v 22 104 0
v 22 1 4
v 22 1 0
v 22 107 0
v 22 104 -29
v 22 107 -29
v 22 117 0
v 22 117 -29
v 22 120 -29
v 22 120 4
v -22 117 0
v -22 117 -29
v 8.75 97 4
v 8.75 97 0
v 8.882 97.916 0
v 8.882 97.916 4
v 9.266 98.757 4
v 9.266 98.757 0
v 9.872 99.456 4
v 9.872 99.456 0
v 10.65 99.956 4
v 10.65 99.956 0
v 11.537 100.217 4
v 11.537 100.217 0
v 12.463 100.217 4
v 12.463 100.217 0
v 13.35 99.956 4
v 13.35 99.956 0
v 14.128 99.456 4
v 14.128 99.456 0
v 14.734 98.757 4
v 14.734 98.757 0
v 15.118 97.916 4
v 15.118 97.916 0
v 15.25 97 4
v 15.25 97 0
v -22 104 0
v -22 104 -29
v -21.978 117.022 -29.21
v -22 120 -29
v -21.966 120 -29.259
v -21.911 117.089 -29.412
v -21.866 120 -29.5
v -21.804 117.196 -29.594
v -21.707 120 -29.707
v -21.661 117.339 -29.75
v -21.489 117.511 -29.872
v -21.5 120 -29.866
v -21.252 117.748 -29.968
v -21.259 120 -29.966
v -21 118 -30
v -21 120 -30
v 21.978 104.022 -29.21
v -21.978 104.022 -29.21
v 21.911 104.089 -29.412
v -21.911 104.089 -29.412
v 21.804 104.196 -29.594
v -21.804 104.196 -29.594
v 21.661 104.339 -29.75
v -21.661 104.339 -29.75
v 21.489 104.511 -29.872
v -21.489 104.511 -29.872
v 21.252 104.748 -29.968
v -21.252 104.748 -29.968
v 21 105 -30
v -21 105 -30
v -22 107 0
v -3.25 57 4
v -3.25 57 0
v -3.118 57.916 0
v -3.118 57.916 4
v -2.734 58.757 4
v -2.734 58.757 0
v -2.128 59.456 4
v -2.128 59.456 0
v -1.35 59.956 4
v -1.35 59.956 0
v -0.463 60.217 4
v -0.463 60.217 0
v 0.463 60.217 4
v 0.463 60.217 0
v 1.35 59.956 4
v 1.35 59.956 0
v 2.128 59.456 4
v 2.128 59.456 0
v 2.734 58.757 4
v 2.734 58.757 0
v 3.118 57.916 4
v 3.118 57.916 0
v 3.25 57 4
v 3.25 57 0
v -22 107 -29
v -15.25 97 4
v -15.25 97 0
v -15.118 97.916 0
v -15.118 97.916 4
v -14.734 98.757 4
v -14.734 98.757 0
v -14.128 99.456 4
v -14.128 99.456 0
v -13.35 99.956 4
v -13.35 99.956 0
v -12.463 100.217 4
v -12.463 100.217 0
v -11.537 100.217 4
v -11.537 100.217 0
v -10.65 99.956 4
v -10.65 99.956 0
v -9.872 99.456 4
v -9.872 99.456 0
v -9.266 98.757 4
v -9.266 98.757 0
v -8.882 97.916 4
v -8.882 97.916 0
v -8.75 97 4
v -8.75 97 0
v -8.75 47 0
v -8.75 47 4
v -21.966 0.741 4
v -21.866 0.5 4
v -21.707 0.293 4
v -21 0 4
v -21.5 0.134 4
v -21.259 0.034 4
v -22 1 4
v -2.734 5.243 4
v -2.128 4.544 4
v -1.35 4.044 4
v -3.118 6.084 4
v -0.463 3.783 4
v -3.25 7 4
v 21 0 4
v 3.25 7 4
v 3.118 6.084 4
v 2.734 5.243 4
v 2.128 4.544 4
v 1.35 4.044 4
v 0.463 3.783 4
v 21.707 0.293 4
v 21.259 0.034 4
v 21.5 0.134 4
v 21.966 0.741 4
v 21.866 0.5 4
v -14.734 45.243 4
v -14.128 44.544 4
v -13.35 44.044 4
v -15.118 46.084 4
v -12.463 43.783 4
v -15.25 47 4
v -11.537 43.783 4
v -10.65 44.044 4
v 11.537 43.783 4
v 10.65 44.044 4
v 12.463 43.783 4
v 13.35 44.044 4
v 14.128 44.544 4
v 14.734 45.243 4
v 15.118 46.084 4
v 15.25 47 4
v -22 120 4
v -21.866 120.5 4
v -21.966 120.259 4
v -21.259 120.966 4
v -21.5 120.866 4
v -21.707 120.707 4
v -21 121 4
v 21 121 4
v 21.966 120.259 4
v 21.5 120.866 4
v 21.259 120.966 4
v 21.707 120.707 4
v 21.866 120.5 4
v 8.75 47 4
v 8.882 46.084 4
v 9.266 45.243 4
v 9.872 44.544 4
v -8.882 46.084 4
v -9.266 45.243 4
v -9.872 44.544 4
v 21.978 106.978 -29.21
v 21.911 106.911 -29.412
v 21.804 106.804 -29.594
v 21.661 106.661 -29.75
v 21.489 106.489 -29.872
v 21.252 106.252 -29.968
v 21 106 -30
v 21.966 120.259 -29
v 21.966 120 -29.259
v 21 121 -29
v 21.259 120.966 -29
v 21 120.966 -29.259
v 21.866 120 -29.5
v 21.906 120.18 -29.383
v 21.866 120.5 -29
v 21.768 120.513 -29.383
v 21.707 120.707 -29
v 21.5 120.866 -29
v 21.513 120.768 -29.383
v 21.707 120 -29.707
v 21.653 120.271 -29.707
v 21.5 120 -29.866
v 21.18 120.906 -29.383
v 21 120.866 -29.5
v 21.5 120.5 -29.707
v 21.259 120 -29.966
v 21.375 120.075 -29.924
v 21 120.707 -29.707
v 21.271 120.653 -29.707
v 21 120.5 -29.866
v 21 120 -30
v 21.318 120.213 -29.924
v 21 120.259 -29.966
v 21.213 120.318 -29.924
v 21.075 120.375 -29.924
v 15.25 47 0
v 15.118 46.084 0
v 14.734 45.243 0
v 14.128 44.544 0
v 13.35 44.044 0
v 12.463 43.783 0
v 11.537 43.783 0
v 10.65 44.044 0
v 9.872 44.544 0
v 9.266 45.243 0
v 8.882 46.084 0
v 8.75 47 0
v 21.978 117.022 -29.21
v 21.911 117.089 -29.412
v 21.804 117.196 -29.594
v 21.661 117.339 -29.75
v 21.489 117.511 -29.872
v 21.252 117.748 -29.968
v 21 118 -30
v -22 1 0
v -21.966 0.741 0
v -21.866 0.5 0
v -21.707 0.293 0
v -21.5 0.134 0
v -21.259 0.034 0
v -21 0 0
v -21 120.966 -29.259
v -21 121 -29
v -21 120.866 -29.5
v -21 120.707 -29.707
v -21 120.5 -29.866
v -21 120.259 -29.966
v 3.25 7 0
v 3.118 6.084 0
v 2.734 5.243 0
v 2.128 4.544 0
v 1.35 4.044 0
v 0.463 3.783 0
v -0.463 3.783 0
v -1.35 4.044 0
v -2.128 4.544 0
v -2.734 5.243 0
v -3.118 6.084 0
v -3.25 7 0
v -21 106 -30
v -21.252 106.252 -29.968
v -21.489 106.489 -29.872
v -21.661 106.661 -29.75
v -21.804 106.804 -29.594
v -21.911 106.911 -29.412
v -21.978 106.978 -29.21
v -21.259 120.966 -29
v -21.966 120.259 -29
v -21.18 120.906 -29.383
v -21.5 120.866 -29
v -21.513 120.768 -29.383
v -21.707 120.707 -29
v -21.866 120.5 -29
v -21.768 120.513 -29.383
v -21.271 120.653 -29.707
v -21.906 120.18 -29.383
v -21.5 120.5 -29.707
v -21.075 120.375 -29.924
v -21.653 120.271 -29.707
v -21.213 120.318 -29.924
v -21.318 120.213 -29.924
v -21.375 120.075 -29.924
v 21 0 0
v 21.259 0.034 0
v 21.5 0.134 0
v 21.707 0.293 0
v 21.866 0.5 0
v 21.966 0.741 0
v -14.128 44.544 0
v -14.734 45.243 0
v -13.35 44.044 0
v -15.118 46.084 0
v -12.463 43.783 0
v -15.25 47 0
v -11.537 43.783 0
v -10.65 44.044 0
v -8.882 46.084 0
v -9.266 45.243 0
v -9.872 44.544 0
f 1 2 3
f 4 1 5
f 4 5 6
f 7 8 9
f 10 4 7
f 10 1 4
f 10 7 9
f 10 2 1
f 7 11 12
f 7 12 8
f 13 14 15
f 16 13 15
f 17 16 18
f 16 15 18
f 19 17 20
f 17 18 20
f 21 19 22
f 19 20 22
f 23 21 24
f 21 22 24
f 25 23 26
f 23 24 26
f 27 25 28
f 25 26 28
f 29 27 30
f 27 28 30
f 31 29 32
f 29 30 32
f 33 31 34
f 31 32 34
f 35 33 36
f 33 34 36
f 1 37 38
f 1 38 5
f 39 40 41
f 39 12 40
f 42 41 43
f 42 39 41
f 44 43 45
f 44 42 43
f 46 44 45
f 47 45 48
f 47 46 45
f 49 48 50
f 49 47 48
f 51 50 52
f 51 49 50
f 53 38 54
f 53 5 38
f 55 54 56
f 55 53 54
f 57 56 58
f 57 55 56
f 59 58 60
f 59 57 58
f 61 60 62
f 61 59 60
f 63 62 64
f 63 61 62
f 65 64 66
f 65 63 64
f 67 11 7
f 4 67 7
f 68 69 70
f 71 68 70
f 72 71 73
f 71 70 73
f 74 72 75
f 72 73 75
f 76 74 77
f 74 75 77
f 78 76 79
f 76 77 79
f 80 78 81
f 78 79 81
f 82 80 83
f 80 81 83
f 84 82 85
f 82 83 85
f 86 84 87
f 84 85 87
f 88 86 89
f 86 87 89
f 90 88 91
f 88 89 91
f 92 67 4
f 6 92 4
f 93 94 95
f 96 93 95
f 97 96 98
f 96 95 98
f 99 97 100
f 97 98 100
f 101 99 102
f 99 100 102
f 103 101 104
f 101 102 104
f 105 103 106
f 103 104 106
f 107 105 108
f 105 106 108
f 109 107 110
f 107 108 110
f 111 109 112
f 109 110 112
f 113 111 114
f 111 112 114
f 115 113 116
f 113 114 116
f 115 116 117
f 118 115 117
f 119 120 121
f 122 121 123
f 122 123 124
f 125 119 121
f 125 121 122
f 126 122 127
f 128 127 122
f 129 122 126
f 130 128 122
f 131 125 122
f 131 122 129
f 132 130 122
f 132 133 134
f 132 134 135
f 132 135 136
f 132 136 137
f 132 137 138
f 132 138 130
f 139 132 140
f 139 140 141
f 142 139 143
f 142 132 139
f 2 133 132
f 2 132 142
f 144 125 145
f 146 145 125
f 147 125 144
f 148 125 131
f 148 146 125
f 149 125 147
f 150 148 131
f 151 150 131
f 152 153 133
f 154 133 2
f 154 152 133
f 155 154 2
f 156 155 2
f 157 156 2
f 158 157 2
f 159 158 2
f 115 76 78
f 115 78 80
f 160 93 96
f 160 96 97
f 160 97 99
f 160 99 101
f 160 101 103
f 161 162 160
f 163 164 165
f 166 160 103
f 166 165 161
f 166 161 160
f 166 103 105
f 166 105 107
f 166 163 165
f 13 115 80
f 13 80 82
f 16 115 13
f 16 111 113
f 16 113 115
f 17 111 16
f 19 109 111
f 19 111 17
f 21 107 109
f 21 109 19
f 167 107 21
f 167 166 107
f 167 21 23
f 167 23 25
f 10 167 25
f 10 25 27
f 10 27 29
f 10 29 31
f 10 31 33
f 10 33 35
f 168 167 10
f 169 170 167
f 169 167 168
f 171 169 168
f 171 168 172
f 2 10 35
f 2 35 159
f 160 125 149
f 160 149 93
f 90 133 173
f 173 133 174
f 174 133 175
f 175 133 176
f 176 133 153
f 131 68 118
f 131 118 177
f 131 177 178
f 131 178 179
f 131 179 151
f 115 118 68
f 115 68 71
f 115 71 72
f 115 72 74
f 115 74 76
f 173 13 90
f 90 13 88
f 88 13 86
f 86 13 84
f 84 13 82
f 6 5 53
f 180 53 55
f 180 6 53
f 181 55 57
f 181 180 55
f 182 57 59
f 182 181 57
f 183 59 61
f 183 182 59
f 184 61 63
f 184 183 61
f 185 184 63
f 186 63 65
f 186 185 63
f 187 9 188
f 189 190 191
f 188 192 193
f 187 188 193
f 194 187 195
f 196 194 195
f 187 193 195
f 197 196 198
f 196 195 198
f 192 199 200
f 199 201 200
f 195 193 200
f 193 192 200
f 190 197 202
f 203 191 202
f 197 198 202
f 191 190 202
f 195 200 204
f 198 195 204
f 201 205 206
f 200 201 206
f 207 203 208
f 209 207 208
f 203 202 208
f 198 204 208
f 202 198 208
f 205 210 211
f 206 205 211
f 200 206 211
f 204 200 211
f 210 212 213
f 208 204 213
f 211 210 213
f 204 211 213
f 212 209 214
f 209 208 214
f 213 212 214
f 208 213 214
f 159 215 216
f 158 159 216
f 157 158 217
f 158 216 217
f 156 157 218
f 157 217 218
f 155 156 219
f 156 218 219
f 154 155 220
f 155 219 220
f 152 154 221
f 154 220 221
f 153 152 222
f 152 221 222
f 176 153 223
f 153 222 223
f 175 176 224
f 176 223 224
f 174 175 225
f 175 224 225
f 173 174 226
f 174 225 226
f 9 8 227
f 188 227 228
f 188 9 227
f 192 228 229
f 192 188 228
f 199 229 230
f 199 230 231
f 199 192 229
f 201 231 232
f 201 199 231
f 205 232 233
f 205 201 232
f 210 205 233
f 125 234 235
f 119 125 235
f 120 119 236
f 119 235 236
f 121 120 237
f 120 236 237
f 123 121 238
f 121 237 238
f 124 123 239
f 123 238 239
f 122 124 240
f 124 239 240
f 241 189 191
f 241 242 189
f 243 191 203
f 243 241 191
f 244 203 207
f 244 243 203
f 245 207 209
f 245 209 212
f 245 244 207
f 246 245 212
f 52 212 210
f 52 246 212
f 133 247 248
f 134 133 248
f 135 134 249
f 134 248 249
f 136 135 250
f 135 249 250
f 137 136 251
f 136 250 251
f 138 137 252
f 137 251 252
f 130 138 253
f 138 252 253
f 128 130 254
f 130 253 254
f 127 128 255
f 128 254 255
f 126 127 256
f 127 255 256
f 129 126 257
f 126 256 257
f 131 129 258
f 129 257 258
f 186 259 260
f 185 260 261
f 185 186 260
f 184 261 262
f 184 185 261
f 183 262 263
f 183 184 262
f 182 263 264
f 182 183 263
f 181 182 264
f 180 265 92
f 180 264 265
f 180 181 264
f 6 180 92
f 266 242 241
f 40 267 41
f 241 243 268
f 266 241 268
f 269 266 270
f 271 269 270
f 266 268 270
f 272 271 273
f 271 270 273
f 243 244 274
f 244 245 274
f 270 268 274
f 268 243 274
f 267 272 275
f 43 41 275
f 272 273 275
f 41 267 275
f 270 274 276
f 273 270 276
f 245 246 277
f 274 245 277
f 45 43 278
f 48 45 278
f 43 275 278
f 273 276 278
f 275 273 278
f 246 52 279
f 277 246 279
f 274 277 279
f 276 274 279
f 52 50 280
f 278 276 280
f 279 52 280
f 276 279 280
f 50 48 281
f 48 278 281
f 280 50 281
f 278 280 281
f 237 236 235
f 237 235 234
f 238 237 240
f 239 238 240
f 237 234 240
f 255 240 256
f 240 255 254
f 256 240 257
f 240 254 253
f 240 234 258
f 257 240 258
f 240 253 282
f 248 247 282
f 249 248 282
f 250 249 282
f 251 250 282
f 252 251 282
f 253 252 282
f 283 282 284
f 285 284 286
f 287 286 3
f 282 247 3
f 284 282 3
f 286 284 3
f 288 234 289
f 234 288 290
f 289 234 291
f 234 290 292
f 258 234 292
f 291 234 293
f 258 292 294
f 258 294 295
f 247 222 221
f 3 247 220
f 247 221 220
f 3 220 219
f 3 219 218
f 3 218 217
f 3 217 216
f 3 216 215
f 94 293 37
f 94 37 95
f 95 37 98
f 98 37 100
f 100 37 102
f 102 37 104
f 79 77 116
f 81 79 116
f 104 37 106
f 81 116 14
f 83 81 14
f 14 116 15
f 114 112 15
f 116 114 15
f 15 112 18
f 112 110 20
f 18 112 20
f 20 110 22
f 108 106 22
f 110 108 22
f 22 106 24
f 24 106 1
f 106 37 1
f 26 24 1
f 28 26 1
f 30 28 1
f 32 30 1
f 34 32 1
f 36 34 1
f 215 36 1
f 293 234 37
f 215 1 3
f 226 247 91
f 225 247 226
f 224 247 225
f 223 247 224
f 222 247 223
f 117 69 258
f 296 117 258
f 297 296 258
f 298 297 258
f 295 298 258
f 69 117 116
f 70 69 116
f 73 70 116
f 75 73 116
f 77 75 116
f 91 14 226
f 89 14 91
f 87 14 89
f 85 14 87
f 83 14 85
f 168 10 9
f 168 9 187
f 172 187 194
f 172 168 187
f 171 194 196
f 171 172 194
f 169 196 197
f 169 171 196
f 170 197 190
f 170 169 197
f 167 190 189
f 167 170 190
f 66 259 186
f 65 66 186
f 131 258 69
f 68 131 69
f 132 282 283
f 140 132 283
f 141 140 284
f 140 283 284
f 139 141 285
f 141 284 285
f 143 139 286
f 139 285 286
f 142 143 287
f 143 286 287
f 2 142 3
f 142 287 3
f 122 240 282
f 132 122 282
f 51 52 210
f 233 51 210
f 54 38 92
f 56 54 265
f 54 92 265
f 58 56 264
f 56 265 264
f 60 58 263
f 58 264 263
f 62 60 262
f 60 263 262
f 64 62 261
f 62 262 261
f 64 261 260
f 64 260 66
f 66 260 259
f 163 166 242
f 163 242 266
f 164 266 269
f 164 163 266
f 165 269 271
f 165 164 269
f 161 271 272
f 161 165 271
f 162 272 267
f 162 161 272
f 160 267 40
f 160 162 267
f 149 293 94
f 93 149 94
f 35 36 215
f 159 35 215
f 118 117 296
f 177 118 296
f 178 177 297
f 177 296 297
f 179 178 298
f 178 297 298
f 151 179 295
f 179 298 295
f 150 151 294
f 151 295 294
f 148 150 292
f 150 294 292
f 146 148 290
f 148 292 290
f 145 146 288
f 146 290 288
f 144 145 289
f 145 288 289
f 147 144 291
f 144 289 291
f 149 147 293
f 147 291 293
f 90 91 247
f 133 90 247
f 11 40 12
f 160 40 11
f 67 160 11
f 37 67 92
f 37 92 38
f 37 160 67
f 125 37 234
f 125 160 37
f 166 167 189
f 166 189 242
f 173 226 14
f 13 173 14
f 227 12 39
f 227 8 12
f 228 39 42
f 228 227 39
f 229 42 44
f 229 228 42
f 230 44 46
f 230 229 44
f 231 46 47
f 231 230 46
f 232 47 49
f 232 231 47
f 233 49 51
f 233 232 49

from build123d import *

# Parameters (mm, degrees)
EXTRUDE_1_DEPTH = 4
EXTRUDE_START   = -30
SKETCH_1_3_W    = 44
SKETCH_1_3_H    = 3
EXTRUDE_2_DEPTH = 30
FILLET_1_R      = 1


with BuildPart() as part:
    # 草图1 → 凸台-拉伸1 (new body)
    with BuildSketch(Plane.XY):
        with BuildLine():
            ThreePointArc((-22, 1), (-21.707106781, 0.292893219), (-21, 0))
            Line((-21, 0), (21, 0))
            ThreePointArc((21, 0), (21.707106781, 0.292893219), (22, 1))
            Line((22, 1), (22, 120))
            ThreePointArc((22, 120), (21.707106781, 120.707106781), (21, 121))
            Line((21, 121), (-21, 121))
            ThreePointArc((-21, 121), (-21.707106781, 120.707106781), (-22, 120))
            Line((-22, 120), (-22, 1))
        make_face()
        with BuildLine():
            ThreePointArc((3.25, 7), (0, 3.75), (-3.25, 7))
            Line((-3.25, 7), (-3.25, 57))
            ThreePointArc((-3.25, 57), (0, 60.25), (3.25, 57))
            Line((3.25, 57), (3.25, 7))
        make_face(mode=Mode.SUBTRACT)
        with BuildLine():
            ThreePointArc((-15.25, 97), (-12, 100.25), (-8.75, 97))
            Line((-8.75, 97), (-8.75, 47))
            ThreePointArc((-8.75, 47), (-12, 43.75), (-15.25, 47))
            Line((-15.25, 47), (-15.25, 97))
        make_face(mode=Mode.SUBTRACT)
        with BuildLine():
            Line((8.75, 47), (8.75, 97))
            ThreePointArc((8.75, 97), (12, 100.25), (15.25, 97))
            Line((15.25, 97), (15.25, 47))
            ThreePointArc((15.25, 47), (12, 43.75), (8.75, 47))
        make_face(mode=Mode.SUBTRACT)
    extrude(amount=EXTRUDE_1_DEPTH)

    # 草图1<3> → 凸台-拉伸2 (add)
    with BuildSketch(Plane.XY.offset(EXTRUDE_START)):
        with Locations((0, 105.5)):
            Rectangle(SKETCH_1_3_W, SKETCH_1_3_H)
        with BuildLine():
            Line((-22, 120), (-22, 117))
            Line((-22, 117), (22, 117))
            Line((22, 117), (22, 120))
            ThreePointArc((22, 120), (21.707106781, 120.707106781), (21, 121))
            Line((21, 121), (-21, 121))
            ThreePointArc((-21, 121), (-21.707106781, 120.707106781), (-22, 120))
        make_face()
    extrude(amount=EXTRUDE_2_DEPTH)

    # 圆角1
    fillet_1_edges = [part.edges().sort_by_distance(p)[0] for p in [
        (-22, 118.5, -30),
        (-21.707106781, 120.707106781, -30),
        (0, 121, -30),
        (21.707106781, 120.707106781, -30),
        (0, 104, -30),
        (0, 107, -30),
        (0, 117, -30),
        (22, 118.5, -30),
        (-22, 105.5, -30),
        (22, 105.5, -30),
    ]]
    fillet(fillet_1_edges, radius=FILLET_1_R)


solid = part.part
